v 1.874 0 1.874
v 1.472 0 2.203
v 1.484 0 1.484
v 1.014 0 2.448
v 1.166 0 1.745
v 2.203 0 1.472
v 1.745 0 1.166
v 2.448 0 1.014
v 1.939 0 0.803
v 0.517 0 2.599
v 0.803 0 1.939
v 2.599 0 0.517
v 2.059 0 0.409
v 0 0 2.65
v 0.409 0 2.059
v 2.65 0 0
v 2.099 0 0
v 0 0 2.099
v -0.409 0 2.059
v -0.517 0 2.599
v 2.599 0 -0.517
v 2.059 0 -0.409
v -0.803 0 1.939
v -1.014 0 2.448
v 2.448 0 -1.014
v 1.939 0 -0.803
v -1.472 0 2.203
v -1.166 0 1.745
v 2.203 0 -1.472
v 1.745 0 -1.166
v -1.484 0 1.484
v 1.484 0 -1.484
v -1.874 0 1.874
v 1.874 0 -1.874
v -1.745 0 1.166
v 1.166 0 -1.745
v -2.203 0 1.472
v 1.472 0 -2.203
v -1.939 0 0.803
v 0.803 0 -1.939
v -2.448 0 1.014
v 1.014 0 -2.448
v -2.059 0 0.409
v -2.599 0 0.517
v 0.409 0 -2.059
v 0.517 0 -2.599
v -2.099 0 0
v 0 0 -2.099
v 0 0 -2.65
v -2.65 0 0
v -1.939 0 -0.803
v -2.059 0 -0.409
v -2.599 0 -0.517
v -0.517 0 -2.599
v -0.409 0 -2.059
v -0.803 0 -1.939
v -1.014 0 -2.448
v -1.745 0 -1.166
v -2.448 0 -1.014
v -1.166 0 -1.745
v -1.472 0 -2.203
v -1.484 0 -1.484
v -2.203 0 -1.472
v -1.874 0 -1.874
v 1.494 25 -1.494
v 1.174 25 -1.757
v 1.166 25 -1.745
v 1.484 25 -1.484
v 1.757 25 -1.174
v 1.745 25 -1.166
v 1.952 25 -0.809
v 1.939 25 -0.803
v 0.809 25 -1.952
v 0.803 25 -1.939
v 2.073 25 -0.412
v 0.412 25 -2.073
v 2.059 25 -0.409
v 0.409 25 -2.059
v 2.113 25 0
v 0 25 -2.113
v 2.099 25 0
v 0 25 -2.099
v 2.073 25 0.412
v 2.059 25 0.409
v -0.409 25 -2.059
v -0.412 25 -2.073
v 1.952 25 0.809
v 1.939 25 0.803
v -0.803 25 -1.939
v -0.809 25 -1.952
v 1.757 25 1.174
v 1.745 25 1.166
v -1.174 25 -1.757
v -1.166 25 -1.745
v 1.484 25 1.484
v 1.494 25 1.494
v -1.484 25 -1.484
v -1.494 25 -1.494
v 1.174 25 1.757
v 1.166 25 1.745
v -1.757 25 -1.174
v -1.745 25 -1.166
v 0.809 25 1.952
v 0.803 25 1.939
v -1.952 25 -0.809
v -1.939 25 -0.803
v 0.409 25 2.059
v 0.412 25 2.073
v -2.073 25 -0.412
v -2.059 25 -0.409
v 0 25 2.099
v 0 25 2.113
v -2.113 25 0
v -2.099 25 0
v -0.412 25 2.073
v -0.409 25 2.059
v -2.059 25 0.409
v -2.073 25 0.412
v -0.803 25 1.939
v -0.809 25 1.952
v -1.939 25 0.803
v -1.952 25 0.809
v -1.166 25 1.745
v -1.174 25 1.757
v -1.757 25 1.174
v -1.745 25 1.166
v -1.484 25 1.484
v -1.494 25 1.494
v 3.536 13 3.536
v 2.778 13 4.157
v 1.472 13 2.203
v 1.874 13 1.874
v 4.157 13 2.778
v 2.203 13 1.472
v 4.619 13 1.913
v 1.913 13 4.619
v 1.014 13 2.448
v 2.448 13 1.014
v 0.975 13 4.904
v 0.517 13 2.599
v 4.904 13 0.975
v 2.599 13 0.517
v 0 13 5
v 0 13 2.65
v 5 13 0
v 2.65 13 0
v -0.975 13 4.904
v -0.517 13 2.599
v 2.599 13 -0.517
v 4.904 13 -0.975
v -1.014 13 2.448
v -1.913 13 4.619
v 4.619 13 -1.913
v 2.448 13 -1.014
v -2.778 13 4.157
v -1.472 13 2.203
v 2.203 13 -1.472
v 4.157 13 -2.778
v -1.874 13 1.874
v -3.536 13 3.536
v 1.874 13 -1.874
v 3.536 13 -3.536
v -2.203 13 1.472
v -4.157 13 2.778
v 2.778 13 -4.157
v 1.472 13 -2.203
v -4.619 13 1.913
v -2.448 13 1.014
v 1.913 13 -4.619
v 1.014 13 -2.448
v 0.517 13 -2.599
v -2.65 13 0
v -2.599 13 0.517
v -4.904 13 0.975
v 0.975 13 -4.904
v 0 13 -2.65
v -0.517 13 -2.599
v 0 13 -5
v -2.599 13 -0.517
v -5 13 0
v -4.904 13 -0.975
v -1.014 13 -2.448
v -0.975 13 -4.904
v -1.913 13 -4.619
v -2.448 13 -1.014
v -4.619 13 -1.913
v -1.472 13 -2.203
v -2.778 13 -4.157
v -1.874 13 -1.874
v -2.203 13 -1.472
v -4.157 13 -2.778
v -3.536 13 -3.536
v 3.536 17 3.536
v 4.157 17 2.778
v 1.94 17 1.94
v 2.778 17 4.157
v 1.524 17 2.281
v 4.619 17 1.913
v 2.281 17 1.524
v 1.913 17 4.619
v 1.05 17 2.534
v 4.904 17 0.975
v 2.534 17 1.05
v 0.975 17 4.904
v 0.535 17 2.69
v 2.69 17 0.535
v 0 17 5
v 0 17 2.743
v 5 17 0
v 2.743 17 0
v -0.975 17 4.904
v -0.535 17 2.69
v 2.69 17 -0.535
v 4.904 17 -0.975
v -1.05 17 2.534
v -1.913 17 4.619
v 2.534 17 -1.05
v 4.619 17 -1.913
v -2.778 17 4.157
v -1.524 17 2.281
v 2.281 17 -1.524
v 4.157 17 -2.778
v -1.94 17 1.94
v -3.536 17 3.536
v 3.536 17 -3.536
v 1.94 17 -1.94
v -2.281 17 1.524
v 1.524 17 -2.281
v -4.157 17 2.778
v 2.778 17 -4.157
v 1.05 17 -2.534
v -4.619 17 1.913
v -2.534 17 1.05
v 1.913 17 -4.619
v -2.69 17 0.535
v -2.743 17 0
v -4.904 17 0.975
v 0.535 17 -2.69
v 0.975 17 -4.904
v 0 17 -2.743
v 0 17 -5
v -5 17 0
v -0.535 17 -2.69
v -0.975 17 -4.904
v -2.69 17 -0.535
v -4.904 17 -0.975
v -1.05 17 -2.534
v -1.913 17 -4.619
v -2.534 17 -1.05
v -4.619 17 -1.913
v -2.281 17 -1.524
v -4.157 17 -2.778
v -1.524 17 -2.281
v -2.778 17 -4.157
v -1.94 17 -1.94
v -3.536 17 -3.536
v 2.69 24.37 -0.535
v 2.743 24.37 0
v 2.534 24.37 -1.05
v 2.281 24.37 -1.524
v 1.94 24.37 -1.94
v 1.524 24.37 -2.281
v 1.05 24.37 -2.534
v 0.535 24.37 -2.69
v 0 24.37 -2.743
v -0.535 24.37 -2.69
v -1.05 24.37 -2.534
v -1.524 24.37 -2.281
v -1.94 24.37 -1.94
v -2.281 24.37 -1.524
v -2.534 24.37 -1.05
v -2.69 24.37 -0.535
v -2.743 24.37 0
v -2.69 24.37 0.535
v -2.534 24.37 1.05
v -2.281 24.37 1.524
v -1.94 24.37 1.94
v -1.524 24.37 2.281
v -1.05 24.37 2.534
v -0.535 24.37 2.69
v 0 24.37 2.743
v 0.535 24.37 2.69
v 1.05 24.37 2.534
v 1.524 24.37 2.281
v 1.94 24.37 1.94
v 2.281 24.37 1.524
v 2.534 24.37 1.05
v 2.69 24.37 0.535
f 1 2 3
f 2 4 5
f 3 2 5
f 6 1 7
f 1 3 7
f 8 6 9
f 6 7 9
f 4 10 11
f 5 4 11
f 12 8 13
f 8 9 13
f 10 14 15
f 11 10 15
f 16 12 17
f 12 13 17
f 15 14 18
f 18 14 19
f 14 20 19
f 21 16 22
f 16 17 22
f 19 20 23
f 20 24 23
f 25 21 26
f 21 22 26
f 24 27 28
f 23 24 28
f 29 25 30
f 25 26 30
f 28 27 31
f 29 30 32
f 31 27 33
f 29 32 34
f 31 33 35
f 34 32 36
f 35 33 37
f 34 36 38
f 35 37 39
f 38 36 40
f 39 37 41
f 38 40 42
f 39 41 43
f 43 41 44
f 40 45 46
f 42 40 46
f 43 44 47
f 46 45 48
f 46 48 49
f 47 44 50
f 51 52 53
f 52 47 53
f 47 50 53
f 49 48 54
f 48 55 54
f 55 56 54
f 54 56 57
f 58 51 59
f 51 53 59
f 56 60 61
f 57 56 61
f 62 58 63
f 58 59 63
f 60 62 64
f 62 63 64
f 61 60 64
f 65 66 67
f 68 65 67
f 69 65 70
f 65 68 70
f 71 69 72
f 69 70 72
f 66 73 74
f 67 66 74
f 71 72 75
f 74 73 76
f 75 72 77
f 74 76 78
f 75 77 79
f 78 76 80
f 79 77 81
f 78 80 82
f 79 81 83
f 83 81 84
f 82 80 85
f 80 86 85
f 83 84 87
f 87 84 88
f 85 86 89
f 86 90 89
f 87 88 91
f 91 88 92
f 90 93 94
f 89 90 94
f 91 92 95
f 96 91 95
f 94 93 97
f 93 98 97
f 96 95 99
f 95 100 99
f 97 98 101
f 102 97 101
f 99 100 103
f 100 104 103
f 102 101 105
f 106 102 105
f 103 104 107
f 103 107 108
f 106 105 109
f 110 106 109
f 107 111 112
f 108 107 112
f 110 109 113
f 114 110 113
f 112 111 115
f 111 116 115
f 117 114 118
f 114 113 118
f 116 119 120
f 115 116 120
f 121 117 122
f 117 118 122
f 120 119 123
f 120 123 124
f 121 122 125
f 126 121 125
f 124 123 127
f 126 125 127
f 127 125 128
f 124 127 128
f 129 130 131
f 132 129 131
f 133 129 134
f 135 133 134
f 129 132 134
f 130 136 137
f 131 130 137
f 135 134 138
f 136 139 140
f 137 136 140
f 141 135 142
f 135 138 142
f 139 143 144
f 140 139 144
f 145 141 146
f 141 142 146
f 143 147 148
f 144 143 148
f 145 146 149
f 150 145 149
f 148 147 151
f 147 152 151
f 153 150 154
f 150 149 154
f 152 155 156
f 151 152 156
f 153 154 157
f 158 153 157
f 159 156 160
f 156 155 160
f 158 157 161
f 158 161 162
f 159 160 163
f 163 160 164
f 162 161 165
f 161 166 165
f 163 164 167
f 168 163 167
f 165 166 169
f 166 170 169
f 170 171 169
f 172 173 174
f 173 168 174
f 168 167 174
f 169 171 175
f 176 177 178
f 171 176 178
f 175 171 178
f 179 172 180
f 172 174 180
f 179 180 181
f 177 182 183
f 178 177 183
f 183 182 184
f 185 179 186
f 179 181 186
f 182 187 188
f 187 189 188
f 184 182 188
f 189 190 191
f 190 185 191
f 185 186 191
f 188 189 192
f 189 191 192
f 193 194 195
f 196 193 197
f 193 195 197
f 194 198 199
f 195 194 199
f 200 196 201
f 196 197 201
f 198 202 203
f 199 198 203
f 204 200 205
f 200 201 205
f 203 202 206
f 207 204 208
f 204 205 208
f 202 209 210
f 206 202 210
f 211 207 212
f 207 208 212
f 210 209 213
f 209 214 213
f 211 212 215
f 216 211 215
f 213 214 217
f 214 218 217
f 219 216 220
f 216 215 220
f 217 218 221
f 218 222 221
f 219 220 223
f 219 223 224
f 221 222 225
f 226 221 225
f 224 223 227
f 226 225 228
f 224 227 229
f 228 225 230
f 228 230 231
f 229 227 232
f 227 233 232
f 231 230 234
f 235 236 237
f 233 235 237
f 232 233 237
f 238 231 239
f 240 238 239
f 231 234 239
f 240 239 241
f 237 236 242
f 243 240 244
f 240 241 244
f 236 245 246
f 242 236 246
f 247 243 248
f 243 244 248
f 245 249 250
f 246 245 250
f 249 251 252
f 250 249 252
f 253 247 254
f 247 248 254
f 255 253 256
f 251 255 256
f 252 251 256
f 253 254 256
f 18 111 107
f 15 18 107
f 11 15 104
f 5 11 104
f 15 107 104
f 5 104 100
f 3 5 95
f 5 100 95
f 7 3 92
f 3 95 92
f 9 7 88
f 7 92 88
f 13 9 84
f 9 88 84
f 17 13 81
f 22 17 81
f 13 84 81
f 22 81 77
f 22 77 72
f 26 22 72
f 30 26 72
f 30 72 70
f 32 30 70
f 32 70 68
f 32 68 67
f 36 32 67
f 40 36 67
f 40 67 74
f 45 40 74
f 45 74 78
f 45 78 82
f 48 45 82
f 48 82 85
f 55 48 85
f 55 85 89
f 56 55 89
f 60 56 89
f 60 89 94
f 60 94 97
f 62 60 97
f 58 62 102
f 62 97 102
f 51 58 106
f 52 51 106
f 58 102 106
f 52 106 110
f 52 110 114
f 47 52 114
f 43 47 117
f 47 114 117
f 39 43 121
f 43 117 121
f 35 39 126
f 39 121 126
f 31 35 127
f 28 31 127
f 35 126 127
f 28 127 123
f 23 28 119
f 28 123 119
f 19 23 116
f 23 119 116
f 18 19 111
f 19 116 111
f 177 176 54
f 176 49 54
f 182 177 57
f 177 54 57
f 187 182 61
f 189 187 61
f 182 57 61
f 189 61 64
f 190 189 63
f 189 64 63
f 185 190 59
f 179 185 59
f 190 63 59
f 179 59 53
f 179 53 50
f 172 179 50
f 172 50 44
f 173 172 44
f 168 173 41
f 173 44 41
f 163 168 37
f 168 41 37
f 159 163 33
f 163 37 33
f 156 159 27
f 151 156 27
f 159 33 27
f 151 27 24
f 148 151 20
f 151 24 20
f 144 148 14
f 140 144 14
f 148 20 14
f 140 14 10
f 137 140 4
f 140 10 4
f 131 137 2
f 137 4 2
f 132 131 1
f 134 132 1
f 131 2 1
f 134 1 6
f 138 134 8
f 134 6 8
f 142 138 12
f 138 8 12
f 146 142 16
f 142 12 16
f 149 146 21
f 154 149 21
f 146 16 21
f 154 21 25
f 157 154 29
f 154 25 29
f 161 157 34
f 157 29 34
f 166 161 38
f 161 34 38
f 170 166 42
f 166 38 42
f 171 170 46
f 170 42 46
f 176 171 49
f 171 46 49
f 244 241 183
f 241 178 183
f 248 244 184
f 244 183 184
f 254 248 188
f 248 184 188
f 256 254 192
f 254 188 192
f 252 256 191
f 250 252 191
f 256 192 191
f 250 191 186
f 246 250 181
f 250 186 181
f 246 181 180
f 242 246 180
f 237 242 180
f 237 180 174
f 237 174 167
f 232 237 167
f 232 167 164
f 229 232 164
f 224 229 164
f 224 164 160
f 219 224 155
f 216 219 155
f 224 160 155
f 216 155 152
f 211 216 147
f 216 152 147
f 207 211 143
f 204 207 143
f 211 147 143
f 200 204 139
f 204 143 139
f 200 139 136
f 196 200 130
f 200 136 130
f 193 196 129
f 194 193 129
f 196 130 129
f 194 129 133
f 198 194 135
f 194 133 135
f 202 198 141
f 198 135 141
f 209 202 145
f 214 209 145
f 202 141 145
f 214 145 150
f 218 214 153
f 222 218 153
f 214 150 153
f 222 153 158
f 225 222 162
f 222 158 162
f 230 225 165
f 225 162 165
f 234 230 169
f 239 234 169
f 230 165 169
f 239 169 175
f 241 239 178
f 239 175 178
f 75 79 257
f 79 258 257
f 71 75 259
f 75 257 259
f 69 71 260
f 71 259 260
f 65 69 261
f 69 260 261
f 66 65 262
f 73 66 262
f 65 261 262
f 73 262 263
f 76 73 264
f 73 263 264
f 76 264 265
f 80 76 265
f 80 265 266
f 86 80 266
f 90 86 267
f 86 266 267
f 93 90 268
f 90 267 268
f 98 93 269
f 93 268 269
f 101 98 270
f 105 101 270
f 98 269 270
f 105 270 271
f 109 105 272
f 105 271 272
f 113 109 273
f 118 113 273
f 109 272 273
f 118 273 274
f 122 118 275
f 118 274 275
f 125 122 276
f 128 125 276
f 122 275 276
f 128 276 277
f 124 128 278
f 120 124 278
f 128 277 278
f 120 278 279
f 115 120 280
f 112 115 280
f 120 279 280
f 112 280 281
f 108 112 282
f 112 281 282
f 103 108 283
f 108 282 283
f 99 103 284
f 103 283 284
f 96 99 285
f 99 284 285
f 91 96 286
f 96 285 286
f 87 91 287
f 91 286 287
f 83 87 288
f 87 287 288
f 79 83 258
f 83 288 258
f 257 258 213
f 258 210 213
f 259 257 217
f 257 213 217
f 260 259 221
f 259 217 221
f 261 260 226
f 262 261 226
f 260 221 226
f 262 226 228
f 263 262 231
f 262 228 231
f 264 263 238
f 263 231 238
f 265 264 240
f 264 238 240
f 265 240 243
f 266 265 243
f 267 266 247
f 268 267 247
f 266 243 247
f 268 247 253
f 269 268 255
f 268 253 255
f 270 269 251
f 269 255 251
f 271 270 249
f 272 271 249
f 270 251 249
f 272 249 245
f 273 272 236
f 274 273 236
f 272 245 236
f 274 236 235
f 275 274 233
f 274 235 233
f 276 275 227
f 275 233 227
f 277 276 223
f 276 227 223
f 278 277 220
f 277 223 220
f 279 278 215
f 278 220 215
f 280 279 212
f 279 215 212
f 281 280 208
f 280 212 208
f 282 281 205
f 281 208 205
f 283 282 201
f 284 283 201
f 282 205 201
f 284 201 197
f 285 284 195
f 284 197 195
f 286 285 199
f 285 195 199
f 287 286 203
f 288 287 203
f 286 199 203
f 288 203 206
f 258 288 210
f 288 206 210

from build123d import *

# Parameters (mm, degrees)
SKETCH3_R          = 2.098913331
CUT_EXTRUDE1_DEPTH = 60


# Read off the part's stored shape, not the designer's step: #12-24 Machine Threads Stud1
with BuildPart() as part:
    # Sketch2 → Revolve1 (revolve)
    with BuildSketch(Plane.XY, mode=Mode.PRIVATE) as revolve1_sk:
        Polygon((0, 0), (0, 25), (-3.15, 25), (-3.15, 17), (-5, 17), (-5, 13), (-2.65, 13), (-2.65, 0), align=None)
    revolve(revolve1_sk.sketch.rotate(Axis((0, 0, 0), (0, 1, 0)), 270), axis=Axis((0, 0, 0), (0, 1, 0)))

    # Sketch3 → Cut-Extrude1 (cut)
    with BuildSketch(Plane(origin=(0, 25, 0), x_dir=(1, 0, 0), z_dir=(0, 1, 0))):
        with Locations(Location((0, 0, 0), (0, 0, 270))):
            Circle(SKETCH3_R)
    extrude(amount=-CUT_EXTRUDE1_DEPTH, mode=Mode.SUBTRACT)

    # #12-24 Machine Threads Stud1 outline → #12-24 Machine Threads Stud1 (revolve, cut)
    with BuildSketch(Plane.XY):
        Polygon((2.7432, 24.37008), (2.7432, 17), (3.15, 17), (3.15, 25), (2.11328, 25), align=None)
    revolve(axis=Axis((0, 0, 0), (0, 1, 0)), mode=Mode.SUBTRACT)


solid = part.part
